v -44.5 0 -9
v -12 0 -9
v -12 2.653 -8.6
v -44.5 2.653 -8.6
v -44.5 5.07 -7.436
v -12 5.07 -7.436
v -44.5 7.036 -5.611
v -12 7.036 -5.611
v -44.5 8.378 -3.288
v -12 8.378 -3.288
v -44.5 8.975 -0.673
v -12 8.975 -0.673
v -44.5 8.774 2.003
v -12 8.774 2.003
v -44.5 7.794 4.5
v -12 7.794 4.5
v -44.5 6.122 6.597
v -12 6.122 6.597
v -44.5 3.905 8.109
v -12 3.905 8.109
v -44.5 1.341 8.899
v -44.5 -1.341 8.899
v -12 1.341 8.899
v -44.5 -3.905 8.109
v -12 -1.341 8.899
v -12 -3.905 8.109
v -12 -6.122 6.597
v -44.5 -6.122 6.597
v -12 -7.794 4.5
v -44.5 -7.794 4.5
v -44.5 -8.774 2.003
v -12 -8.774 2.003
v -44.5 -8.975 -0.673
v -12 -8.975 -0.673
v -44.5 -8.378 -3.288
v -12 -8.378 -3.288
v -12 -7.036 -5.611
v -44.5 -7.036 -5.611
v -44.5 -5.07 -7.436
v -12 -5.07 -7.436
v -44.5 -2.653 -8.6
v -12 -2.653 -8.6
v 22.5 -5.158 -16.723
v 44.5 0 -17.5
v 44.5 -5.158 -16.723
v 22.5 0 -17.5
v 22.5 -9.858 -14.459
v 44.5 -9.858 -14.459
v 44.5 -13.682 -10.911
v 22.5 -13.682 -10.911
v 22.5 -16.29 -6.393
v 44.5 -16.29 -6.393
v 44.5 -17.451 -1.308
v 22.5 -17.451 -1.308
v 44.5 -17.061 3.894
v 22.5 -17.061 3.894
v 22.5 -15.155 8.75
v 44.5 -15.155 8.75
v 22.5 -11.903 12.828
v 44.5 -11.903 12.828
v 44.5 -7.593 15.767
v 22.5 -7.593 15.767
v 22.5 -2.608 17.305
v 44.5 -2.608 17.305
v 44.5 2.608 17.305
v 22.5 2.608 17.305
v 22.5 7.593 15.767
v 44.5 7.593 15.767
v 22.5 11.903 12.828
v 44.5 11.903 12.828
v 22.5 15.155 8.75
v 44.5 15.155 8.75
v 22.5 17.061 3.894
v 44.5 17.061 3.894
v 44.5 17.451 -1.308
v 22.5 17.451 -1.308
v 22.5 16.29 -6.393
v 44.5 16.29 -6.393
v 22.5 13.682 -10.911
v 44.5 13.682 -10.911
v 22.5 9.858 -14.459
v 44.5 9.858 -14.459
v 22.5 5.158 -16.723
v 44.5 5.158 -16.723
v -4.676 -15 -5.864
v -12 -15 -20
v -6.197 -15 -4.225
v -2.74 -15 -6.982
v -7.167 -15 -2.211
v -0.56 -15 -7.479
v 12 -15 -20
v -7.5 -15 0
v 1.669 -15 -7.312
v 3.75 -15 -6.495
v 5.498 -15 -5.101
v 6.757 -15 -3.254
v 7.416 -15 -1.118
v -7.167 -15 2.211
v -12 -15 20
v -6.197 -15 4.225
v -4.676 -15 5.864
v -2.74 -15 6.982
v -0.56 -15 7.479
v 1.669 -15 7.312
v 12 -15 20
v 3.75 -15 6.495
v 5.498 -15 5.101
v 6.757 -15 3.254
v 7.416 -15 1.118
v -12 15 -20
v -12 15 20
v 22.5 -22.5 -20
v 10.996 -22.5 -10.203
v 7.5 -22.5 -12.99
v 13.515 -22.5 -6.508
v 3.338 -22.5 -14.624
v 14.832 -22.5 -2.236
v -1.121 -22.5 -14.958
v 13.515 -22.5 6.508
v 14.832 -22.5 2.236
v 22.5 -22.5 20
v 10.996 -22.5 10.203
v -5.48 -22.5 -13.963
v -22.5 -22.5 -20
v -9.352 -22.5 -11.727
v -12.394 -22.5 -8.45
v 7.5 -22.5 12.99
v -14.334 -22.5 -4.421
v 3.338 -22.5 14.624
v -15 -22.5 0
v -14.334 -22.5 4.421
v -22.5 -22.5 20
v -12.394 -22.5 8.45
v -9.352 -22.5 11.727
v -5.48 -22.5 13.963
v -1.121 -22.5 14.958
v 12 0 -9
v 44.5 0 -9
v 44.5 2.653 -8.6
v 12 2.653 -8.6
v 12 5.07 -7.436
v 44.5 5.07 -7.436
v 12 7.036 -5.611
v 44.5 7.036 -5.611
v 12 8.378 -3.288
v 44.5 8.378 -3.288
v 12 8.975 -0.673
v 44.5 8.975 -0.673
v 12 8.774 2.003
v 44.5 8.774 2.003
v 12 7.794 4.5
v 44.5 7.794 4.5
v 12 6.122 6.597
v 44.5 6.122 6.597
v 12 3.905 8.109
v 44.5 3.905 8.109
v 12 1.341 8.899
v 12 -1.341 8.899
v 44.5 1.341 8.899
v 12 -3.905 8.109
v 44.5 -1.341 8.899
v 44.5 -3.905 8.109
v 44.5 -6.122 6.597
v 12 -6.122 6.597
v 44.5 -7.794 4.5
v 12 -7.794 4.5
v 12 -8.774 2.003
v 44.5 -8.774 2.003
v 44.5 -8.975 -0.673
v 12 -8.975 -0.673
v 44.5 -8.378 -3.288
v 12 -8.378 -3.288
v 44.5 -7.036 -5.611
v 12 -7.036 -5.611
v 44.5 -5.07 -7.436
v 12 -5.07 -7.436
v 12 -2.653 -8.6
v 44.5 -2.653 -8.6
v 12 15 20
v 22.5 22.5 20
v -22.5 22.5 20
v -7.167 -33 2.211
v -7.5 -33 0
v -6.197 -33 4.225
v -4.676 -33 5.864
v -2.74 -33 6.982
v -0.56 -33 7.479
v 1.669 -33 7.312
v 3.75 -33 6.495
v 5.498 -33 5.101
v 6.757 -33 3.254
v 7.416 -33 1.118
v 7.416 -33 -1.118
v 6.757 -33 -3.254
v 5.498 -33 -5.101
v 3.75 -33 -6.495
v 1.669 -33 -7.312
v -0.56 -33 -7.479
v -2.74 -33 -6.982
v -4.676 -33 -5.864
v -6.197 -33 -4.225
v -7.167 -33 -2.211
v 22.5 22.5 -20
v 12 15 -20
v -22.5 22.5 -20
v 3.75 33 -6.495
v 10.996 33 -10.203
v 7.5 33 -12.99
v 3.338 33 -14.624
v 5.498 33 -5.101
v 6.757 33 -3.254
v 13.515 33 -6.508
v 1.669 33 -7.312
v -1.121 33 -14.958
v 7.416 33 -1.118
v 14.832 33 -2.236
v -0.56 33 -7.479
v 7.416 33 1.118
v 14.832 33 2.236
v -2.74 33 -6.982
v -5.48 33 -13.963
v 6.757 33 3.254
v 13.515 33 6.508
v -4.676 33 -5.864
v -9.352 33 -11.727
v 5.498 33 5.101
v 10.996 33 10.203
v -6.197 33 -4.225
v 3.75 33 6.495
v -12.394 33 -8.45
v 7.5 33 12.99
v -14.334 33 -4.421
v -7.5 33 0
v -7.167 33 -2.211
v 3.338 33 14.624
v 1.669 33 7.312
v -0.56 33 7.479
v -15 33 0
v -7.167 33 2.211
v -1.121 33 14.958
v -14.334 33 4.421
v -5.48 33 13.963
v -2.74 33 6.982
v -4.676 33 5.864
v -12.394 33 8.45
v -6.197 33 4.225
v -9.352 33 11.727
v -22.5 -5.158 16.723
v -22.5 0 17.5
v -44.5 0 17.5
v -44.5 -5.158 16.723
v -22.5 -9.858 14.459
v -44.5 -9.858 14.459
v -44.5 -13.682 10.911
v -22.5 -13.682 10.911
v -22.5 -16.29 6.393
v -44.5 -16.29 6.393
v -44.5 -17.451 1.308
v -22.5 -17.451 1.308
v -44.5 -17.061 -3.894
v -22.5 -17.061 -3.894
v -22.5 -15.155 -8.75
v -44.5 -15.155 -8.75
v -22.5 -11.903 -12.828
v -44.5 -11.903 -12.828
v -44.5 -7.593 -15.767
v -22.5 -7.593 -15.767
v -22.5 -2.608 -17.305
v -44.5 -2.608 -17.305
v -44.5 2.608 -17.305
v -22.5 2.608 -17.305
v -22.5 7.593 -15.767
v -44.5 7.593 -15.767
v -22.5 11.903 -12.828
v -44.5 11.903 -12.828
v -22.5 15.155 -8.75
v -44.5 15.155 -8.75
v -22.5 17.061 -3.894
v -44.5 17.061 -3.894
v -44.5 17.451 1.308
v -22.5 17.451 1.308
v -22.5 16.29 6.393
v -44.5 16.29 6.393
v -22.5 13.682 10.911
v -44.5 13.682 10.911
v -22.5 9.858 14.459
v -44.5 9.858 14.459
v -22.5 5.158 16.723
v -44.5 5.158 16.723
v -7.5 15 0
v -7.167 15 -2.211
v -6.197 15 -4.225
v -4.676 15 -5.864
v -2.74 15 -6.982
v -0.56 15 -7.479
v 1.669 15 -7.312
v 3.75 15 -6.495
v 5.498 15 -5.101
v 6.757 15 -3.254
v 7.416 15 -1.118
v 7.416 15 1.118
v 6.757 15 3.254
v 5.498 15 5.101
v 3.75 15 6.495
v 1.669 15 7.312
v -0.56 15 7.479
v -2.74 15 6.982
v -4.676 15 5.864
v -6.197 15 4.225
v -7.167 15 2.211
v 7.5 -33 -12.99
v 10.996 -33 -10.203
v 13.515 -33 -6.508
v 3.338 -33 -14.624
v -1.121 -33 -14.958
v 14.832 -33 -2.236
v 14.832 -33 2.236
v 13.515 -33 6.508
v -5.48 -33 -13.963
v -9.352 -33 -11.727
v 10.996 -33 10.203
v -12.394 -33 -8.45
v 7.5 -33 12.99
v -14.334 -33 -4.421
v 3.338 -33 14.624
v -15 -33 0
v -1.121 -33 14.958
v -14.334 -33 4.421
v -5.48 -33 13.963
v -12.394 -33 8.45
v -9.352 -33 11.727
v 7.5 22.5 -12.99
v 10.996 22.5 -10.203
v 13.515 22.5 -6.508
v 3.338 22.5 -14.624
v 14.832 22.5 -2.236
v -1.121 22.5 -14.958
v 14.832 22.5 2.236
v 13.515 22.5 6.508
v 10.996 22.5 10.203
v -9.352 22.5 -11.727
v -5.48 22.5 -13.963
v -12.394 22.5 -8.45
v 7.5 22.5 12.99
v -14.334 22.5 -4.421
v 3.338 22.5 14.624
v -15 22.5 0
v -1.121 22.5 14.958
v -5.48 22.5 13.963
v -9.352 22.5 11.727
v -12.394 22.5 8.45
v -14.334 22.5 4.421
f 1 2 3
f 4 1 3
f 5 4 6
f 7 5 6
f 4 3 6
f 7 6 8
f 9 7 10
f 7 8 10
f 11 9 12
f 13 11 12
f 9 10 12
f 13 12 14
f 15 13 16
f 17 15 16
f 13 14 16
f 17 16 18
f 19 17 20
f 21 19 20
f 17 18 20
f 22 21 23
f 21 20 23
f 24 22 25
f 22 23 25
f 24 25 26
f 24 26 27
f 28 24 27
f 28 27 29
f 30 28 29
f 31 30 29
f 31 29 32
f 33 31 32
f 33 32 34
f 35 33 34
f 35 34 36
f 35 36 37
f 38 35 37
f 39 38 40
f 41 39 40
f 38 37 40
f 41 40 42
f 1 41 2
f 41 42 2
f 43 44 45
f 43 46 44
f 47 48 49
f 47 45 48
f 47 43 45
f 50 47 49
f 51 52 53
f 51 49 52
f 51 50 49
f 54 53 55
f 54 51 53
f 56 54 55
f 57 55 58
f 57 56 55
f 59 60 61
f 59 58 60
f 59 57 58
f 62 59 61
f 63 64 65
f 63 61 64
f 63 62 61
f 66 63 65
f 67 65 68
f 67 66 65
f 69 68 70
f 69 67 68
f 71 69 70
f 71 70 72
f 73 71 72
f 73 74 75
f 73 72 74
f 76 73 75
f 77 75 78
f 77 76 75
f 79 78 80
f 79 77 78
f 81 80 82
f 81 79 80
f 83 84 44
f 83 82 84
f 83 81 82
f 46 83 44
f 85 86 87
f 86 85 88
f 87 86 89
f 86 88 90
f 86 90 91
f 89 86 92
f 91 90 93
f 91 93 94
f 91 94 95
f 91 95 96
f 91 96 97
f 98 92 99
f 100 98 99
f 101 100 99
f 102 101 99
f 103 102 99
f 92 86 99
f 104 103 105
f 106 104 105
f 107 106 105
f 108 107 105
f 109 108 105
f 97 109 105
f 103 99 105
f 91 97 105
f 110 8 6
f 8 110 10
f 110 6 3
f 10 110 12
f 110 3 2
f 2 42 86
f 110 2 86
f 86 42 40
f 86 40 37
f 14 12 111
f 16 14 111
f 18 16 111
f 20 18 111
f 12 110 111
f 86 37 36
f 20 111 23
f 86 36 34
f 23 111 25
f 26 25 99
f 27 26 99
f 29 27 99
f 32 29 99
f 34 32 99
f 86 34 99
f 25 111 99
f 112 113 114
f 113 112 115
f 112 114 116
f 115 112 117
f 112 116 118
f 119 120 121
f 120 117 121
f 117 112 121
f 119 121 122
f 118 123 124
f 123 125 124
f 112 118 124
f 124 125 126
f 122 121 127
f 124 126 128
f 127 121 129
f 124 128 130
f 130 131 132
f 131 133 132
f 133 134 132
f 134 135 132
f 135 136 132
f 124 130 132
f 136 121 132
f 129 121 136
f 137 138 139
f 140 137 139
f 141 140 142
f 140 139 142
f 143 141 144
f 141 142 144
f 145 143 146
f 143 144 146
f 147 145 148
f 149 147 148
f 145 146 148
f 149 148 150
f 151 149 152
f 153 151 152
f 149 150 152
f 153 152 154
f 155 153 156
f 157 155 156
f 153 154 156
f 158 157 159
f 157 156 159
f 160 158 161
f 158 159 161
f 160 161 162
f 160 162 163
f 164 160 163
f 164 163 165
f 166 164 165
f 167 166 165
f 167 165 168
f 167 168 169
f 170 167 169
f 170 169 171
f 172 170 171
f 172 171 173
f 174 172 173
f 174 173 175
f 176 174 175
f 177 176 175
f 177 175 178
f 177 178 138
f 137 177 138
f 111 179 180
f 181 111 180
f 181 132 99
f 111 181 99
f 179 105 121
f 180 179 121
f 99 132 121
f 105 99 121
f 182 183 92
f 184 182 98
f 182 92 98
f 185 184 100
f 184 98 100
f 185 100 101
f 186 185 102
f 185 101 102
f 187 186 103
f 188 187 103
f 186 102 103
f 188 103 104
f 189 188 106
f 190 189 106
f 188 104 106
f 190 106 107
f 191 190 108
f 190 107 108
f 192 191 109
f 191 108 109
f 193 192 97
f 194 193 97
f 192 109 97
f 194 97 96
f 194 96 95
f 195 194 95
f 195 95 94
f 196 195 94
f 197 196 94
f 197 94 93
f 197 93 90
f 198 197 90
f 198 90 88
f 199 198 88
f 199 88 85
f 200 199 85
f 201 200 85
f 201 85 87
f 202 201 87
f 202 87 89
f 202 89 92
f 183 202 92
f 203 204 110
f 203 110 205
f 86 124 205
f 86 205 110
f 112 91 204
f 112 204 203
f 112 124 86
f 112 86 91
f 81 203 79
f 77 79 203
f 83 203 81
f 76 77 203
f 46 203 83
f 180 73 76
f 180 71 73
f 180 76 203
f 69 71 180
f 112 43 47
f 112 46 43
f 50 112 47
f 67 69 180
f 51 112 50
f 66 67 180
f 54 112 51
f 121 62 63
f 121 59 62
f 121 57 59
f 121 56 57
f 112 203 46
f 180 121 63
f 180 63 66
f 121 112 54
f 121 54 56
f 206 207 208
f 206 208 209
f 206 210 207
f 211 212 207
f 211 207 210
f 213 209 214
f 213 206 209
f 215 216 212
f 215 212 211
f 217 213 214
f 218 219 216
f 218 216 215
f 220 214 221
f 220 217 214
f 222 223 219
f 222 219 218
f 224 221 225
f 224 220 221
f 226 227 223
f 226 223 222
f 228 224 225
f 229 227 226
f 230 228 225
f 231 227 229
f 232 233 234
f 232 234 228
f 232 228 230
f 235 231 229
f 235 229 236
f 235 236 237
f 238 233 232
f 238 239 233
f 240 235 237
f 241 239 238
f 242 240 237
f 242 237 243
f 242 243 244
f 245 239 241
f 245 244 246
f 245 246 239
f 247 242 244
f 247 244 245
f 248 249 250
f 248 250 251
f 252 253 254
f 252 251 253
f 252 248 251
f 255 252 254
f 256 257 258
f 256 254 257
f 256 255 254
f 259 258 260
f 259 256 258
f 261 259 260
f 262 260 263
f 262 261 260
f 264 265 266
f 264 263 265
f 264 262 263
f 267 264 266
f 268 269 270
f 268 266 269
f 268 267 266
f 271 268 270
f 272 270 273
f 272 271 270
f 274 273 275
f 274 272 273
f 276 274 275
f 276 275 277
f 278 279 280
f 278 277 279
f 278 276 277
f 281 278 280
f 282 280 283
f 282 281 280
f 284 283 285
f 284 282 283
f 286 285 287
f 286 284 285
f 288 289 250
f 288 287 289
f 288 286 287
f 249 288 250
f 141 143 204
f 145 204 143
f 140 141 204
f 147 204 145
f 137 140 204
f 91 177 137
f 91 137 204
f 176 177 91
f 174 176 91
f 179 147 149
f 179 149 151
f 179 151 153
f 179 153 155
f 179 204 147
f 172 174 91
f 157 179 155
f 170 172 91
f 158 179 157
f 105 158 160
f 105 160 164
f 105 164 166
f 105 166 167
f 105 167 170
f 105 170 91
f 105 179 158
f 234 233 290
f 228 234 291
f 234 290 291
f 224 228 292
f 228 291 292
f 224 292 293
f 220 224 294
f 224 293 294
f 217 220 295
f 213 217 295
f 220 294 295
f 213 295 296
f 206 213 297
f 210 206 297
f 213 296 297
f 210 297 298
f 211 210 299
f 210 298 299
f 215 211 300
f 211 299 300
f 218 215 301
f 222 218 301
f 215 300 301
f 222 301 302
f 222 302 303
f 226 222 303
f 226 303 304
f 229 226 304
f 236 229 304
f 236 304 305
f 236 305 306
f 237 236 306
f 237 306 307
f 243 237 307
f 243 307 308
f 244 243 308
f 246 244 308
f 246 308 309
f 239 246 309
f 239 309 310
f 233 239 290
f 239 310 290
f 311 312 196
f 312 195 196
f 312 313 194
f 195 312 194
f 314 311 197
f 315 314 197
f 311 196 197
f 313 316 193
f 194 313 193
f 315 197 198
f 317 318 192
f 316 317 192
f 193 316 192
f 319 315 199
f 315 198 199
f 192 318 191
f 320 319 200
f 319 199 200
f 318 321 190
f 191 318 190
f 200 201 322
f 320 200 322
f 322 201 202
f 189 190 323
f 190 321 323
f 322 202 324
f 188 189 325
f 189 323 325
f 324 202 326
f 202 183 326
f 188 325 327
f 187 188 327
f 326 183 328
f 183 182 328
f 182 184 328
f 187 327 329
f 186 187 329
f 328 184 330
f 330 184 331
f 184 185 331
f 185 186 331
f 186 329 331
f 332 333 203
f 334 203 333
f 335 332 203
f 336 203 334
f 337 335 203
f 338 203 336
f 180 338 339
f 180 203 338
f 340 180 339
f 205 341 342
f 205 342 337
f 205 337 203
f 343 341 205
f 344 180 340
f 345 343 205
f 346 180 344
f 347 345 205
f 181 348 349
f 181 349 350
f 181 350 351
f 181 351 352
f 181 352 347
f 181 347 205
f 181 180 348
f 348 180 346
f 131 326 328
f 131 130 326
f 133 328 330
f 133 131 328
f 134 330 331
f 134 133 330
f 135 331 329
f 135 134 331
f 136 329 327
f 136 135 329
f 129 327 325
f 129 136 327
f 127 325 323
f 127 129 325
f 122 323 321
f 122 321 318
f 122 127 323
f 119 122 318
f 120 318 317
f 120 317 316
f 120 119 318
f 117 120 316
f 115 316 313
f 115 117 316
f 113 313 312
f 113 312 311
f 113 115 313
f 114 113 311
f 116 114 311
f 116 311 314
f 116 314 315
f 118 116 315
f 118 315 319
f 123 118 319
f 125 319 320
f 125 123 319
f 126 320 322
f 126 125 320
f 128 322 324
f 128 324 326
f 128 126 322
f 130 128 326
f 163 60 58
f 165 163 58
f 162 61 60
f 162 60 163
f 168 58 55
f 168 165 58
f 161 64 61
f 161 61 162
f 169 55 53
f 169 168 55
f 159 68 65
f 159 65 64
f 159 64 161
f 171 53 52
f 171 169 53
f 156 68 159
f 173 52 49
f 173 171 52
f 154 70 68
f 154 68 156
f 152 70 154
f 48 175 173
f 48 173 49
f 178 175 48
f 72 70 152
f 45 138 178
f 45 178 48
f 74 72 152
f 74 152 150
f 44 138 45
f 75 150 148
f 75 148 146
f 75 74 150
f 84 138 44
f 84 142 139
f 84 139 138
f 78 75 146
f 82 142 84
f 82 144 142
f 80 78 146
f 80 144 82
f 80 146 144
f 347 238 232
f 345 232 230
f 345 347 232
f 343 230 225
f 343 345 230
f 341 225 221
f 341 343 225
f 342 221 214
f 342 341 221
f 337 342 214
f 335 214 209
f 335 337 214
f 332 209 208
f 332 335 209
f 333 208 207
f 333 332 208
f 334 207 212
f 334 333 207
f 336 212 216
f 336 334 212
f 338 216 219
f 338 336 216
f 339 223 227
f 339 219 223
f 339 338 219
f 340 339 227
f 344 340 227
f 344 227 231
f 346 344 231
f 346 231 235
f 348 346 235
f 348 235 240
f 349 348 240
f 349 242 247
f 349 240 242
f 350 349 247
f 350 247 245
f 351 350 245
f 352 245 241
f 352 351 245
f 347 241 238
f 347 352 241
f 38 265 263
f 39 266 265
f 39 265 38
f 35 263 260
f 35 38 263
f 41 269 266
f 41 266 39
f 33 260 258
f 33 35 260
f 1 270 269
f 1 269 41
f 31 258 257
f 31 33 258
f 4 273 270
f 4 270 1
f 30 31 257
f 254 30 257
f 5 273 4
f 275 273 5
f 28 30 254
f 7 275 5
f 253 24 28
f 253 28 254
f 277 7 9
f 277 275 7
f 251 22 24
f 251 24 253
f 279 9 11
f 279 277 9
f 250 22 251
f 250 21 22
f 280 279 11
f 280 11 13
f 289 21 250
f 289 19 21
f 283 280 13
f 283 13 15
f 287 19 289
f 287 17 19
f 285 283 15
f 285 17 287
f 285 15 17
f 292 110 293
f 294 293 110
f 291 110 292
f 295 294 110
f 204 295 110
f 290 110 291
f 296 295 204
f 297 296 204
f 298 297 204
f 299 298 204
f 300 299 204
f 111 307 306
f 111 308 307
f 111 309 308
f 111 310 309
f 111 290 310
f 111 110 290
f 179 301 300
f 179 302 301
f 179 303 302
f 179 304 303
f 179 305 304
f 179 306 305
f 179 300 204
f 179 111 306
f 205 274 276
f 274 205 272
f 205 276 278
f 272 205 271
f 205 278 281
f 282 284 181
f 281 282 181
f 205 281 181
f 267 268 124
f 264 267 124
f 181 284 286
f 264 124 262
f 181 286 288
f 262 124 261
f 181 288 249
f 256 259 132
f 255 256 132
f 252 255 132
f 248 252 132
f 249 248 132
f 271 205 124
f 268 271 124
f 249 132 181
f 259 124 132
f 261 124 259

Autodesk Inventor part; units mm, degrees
ref_plane "YZ Plane" through (0, 0, 0) normal (1, 0, 0) x (0, 1, 0)
ref_plane "XZ Plane" through (0, 0, 0) normal (0, 1, 0) x (-1, 0, 0)
ref_plane "XY Plane" through (0, 0, 0) normal (0, 0, 1) x (1, 0, 0)
sketch "Sketch1" plane through (0, 0, 0) normal (0, 1, 0) x (-1, 0, 0)
  circle A0 centre (0, 0) radius 15
  dimension "d0" = 30
sketch "Sketch2" plane through (0, 0, 0) normal (0, 1, 0) x (-1, 0, 0)
  line L0 (0, 0) -> (22.5, 0)
  line L1 (0, 0) -> (-22.5, 0)
  line L2 (-22.5, 0) -> (-22.5, -20)
  line L3 (-22.5, 0) -> (-22.5, 20)
  line L4 (22.5, 0) -> (22.5, -20)
  line L5 (22.5, -20) -> (-22.5, -20)
  line L6 (22.5, 0) -> (22.5, 20)
  line L7 (22.5, 20) -> (-22.5, 20)
  dimension "d1" = 22.5
  dimension "d2" = 22.5
  dimension "d3" = 20
  dimension "d4" = 20
sketch "Sketch3" plane through (0, 0, 0) normal (0, 1, 0) x (-1, 0, 0)
  circle A0 centre (0, 0) radius 7.5
  dimension "d5" = 15
extrude "Extrusion1" add sketch "Sketch1" along normal mid plane 66
extrude "Extrusion2" add sketch "Sketch2" along normal mid plane 45
extrude "Extrusion3" cut sketch "Sketch3" along normal mid plane 100
sketch "Sketch4" plane through (-22.5, 22.5, 20) normal (0, 0, 1) x (1, 0, 0)
  line L0 (10.5, -22.5) -> (10.5, -37.5)
  line L1 (10.5, -37.5) -> (34.5, -37.5)
  line L2 (34.5, -37.5) -> (34.5, -22.5)
  line L3 (10.5, -22.5) -> (10.5, -7.5)
  line L4 (10.5, -7.5) -> (34.5, -7.5)
  line L5 (34.5, -7.5) -> (34.5, -22.5)
  point P0 (22.5, -22.5)
  dimension "d14" = 15
sketch "Sketch5" plane through (22.5, -22.5, -20) normal (1, 0, 0) x (0, 0, -1)
  circle A0 centre (-20, 22.5) radius 17.5
  dimension "d15" = 35
sketch "Sketch6" plane through (22.5, -22.5, -20) normal (1, 0, 0) x (0, 0, -1)
  circle A0 centre (-20, 22.5) radius 9
  dimension "d28" = 18
extrude "Extrusion4" add sketch "Sketch5" along normal blind 22
sketch "Sketch7" plane through (-22.5, -22.5, 20) normal (-1, 0, 0) x (0, 0, 1)
  circle A0 centre (-20, 22.5) radius 17.5
  dimension "d20" = 35
extrude "Extrusion5" add sketch "Sketch7" along normal blind 22
extrude "Extrusion6" cut sketch "Sketch4" against normal blind 100
extrude "Extrusion7" cut sketch "Sketch6" along normal mid plane 200
properties part number "Sólido 1"
